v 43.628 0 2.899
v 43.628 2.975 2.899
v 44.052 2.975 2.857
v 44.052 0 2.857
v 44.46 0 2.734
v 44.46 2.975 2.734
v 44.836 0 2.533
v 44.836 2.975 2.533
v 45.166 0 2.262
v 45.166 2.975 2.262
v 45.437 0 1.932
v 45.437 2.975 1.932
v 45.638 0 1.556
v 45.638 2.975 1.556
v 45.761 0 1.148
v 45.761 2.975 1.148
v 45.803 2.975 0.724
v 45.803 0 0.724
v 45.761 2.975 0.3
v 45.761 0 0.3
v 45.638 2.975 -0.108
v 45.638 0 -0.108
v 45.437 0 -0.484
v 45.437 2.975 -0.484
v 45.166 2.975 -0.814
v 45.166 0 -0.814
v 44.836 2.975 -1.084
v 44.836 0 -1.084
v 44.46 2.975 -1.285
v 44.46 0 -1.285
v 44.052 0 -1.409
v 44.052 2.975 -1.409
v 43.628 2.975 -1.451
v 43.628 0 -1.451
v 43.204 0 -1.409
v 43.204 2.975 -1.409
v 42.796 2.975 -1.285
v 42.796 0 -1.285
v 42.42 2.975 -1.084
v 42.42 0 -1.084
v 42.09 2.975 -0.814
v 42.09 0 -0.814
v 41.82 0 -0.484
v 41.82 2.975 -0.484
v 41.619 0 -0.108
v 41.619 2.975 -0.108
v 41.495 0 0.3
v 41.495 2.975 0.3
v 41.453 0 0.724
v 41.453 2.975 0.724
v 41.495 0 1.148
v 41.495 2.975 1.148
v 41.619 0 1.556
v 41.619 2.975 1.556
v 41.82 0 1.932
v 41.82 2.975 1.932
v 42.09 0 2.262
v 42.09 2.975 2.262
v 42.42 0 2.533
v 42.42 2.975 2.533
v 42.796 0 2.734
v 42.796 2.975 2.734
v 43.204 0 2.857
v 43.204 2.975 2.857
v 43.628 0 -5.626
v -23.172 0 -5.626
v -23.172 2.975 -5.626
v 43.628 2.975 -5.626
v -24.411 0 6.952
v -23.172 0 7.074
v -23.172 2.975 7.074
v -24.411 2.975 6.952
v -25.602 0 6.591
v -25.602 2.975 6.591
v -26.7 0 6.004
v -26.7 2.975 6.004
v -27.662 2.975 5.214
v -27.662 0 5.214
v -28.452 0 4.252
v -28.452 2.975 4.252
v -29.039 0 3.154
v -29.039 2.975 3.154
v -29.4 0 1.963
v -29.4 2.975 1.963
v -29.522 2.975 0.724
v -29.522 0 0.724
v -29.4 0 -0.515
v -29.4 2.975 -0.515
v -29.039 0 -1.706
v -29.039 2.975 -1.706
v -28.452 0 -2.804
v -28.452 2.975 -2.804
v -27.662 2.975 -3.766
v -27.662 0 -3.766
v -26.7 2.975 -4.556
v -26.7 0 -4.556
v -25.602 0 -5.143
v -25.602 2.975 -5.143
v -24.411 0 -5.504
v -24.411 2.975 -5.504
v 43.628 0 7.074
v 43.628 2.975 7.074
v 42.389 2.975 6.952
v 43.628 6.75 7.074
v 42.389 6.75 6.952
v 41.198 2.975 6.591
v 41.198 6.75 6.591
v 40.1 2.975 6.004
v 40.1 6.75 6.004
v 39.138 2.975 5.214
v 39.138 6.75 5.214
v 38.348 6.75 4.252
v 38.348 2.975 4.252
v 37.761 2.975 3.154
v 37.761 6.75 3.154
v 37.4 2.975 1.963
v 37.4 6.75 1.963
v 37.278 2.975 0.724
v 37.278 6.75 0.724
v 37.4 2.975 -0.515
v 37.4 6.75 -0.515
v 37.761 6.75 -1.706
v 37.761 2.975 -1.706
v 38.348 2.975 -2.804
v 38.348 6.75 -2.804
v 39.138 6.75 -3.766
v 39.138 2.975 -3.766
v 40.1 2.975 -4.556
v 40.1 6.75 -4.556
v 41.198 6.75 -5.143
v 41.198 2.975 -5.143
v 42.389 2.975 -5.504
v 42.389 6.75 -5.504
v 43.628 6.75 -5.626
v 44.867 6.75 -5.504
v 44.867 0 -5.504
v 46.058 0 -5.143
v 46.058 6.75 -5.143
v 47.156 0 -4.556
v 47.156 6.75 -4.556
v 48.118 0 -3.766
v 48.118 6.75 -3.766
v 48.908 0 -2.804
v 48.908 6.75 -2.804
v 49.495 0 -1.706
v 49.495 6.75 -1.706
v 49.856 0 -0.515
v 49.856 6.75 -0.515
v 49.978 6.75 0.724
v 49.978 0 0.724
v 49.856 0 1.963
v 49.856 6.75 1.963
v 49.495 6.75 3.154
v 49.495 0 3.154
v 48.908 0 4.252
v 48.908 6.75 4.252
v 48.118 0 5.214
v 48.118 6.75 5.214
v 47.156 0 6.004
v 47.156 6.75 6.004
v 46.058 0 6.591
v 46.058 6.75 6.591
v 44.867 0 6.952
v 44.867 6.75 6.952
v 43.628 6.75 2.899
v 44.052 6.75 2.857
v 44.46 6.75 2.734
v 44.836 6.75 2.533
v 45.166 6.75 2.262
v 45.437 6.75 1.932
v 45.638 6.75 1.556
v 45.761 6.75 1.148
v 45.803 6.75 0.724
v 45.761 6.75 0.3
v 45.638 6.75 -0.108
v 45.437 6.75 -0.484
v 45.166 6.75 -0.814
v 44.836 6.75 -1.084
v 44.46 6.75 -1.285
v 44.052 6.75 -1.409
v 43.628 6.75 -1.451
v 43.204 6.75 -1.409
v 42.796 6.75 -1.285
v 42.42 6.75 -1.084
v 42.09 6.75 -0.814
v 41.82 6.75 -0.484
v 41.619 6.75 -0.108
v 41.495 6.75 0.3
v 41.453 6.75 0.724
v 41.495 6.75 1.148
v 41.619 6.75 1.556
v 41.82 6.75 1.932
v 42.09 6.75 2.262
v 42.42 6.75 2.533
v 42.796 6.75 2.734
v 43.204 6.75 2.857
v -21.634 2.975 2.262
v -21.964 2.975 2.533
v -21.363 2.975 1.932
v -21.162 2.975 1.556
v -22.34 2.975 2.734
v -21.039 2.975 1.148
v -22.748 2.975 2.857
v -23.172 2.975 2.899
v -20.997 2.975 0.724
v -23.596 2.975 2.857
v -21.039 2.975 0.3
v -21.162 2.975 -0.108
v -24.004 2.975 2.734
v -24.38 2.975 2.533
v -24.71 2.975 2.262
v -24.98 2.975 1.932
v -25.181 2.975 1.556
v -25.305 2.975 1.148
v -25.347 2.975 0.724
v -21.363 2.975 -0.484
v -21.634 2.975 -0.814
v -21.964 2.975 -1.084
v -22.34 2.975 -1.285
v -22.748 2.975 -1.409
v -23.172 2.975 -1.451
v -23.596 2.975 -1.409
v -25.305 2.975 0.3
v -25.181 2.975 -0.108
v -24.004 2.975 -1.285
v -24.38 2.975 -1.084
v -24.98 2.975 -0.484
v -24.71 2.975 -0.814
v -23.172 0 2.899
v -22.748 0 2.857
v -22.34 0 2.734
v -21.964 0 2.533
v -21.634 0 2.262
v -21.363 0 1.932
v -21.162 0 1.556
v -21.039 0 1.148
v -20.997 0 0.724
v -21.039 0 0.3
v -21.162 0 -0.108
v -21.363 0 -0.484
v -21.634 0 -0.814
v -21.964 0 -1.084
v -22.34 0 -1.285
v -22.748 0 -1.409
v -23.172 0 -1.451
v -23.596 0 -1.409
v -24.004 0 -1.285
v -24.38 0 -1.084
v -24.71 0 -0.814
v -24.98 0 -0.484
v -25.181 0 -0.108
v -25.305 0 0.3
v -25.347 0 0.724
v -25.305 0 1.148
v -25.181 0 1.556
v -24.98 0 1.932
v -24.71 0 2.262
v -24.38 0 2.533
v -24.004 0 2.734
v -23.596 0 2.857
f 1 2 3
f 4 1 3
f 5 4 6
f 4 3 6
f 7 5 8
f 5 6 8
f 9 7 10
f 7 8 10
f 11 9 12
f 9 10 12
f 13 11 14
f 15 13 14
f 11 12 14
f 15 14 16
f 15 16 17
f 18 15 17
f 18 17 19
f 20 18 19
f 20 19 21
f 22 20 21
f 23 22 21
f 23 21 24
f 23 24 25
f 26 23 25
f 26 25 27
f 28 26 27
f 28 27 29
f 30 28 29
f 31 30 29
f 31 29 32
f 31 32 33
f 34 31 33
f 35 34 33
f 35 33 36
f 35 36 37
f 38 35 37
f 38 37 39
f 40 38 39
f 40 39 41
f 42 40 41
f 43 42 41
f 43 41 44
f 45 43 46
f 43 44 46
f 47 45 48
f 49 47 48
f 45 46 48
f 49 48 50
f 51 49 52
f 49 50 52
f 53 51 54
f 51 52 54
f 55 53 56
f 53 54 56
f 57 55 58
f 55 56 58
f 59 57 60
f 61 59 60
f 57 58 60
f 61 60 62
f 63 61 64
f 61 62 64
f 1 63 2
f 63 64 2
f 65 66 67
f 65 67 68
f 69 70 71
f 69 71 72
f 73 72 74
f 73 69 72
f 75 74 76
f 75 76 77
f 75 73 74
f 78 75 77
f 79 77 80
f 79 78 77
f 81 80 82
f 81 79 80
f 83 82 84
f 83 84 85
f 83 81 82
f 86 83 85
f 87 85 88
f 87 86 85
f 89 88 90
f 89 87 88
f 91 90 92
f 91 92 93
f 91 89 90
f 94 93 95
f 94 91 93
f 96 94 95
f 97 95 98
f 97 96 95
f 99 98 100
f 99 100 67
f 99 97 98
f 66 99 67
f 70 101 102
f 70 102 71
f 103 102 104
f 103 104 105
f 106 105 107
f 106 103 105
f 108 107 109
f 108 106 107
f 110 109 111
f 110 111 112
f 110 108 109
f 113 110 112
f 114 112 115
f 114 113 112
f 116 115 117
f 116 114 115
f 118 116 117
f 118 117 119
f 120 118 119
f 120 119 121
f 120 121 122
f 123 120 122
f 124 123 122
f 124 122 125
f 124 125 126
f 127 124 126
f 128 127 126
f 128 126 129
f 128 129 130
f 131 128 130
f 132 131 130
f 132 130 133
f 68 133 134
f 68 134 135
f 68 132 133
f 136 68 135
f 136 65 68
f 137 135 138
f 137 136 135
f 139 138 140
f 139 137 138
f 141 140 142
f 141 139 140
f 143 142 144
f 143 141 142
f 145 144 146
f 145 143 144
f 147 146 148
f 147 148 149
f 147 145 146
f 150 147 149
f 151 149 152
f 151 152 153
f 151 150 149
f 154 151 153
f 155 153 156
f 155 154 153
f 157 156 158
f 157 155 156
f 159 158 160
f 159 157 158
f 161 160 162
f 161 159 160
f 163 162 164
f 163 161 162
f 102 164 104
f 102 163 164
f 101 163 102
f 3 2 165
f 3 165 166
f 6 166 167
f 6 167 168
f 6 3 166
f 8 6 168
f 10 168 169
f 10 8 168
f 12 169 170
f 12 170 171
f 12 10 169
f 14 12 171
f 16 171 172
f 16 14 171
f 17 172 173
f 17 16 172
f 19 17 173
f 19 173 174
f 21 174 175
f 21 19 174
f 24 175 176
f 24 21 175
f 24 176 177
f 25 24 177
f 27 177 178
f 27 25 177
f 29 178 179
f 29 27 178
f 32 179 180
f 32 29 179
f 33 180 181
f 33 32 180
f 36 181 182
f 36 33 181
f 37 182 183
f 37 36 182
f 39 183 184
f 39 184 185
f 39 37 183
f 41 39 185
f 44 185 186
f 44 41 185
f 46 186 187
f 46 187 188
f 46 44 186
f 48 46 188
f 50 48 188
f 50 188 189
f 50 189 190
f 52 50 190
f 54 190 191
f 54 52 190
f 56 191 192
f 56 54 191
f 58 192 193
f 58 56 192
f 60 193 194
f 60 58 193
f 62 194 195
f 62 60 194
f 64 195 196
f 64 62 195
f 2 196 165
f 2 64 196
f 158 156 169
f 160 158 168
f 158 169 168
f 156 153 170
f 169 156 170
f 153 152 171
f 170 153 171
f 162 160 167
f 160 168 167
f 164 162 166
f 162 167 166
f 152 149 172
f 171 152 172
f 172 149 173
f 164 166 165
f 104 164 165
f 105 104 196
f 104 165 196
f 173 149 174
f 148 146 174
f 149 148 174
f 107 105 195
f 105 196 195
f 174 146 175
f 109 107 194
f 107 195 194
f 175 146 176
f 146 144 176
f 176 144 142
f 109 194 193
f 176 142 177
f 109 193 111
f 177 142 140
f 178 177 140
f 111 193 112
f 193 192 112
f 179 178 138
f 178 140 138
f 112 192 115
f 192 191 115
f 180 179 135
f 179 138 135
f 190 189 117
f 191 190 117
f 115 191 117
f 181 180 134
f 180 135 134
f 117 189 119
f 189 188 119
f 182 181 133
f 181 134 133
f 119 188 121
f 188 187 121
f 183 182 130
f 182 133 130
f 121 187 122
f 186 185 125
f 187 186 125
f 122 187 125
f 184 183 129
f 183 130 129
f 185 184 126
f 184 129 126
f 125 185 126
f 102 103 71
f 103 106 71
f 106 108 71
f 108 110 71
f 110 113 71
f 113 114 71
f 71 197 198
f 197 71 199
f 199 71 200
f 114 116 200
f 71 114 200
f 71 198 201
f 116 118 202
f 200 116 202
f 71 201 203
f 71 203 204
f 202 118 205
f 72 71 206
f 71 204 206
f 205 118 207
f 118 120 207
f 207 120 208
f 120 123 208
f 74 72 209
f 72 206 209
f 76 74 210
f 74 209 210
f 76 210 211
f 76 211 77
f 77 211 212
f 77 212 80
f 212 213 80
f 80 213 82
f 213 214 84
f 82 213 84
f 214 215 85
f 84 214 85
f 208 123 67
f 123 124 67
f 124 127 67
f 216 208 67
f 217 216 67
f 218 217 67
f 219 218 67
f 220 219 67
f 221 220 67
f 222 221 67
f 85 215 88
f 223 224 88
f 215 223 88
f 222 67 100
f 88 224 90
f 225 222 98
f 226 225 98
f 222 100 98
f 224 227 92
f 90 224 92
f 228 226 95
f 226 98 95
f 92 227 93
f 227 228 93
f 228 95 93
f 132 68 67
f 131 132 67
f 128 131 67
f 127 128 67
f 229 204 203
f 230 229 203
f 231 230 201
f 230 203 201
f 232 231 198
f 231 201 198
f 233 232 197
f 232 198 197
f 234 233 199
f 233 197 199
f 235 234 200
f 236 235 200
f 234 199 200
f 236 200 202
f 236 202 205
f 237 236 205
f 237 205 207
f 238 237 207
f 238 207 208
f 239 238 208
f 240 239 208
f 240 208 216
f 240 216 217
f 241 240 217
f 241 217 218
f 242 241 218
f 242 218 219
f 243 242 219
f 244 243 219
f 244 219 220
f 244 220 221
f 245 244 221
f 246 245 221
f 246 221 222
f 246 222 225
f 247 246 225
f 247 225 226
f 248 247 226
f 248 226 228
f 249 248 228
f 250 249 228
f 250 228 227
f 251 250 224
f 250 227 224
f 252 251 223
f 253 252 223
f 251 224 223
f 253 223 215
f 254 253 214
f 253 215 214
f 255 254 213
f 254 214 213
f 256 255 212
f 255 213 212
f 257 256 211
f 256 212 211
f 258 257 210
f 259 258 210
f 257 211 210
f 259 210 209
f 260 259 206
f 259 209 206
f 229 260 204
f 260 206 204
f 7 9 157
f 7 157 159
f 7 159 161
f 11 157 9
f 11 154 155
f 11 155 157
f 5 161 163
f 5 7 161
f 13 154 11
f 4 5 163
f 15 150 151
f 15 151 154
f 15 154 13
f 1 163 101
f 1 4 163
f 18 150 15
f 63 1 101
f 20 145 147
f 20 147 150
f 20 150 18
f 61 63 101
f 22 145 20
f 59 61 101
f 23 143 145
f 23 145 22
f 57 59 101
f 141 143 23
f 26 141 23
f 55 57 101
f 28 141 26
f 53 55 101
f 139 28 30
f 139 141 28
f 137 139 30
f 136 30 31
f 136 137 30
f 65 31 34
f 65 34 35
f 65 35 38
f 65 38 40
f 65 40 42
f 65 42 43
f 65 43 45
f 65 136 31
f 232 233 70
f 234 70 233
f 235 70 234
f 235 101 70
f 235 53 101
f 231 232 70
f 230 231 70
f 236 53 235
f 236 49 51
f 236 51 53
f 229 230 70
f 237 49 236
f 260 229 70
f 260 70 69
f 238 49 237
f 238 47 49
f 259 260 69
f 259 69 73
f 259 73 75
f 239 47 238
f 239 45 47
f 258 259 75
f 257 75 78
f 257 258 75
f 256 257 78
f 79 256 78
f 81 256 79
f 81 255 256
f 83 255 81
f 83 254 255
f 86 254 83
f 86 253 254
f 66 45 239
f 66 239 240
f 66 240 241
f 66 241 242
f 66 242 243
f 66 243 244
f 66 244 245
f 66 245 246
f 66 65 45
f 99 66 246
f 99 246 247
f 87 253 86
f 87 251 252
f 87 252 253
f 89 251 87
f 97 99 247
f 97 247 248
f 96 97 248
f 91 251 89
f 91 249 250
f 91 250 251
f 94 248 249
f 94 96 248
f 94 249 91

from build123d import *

# Parameters (mm, degrees)
BOSS_EXTRUDE1_DEPTH = 2.975
SKETCH2_R           = 2.175
CUT_EXTRUDE1_DEPTH  = 12.7
SKETCH3_R           = 2.175
BOSS_EXTRUDE2_DEPTH = 3.775


with BuildPart() as part:
    # Sketch1 → Boss-Extrude1 (new body)
    with BuildSketch(Plane(origin=(0, 0, 0), x_dir=(1, 0, 0), z_dir=(0, 1, 0))):
        with BuildLine():
            Line((-23.171929825, 5.625877193), (43.628070175, 5.625877193))
            ThreePointArc((43.628070175, 5.625877193), (49.978070175, -0.724122807), (43.628070175, -7.074122807))
            Line((43.628070175, -7.074122807), (-23.171929825, -7.074122807))
            ThreePointArc((-23.171929825, -7.074122807), (-29.521929825, -0.724122807), (-23.171929825, 5.625877193))
        make_face()
    extrude(amount=BOSS_EXTRUDE1_DEPTH)

    # Sketch2 → Cut-Extrude1 (cut)
    with BuildSketch(Plane(origin=(0, 2.975, 0), x_dir=(1, 0, 0), z_dir=(0, 1, 0))):
        with Locations(Location((-23.171929825, -0.724122807, 0), (0, 0, 270))):
            Circle(SKETCH2_R)
        with Locations(Location((43.628070175, -0.724122807, 0), (0, 0, 270))):
            Circle(SKETCH2_R)
    extrude(amount=-CUT_EXTRUDE1_DEPTH, mode=Mode.SUBTRACT)

    # Sketch3 → Boss-Extrude2 (add)
    with BuildSketch(Plane(origin=(0, 2.975, 0), x_dir=(1, 0, 0), z_dir=(0, 1, 0))):
        with BuildLine():
            ThreePointArc((43.628070175, 5.625877193), (49.978070175, -0.724122807), (43.628070175, -7.074122807))
            ThreePointArc((43.628070175, -7.074122807), (37.278070175, -0.724122807), (43.628070175, 5.625877193))
        make_face()
        with Locations(Location((43.628070175, -0.724122807, 0), (0, 0, 270))):
            Circle(SKETCH3_R, mode=Mode.SUBTRACT)
    extrude(amount=BOSS_EXTRUDE2_DEPTH)


solid = part.part
